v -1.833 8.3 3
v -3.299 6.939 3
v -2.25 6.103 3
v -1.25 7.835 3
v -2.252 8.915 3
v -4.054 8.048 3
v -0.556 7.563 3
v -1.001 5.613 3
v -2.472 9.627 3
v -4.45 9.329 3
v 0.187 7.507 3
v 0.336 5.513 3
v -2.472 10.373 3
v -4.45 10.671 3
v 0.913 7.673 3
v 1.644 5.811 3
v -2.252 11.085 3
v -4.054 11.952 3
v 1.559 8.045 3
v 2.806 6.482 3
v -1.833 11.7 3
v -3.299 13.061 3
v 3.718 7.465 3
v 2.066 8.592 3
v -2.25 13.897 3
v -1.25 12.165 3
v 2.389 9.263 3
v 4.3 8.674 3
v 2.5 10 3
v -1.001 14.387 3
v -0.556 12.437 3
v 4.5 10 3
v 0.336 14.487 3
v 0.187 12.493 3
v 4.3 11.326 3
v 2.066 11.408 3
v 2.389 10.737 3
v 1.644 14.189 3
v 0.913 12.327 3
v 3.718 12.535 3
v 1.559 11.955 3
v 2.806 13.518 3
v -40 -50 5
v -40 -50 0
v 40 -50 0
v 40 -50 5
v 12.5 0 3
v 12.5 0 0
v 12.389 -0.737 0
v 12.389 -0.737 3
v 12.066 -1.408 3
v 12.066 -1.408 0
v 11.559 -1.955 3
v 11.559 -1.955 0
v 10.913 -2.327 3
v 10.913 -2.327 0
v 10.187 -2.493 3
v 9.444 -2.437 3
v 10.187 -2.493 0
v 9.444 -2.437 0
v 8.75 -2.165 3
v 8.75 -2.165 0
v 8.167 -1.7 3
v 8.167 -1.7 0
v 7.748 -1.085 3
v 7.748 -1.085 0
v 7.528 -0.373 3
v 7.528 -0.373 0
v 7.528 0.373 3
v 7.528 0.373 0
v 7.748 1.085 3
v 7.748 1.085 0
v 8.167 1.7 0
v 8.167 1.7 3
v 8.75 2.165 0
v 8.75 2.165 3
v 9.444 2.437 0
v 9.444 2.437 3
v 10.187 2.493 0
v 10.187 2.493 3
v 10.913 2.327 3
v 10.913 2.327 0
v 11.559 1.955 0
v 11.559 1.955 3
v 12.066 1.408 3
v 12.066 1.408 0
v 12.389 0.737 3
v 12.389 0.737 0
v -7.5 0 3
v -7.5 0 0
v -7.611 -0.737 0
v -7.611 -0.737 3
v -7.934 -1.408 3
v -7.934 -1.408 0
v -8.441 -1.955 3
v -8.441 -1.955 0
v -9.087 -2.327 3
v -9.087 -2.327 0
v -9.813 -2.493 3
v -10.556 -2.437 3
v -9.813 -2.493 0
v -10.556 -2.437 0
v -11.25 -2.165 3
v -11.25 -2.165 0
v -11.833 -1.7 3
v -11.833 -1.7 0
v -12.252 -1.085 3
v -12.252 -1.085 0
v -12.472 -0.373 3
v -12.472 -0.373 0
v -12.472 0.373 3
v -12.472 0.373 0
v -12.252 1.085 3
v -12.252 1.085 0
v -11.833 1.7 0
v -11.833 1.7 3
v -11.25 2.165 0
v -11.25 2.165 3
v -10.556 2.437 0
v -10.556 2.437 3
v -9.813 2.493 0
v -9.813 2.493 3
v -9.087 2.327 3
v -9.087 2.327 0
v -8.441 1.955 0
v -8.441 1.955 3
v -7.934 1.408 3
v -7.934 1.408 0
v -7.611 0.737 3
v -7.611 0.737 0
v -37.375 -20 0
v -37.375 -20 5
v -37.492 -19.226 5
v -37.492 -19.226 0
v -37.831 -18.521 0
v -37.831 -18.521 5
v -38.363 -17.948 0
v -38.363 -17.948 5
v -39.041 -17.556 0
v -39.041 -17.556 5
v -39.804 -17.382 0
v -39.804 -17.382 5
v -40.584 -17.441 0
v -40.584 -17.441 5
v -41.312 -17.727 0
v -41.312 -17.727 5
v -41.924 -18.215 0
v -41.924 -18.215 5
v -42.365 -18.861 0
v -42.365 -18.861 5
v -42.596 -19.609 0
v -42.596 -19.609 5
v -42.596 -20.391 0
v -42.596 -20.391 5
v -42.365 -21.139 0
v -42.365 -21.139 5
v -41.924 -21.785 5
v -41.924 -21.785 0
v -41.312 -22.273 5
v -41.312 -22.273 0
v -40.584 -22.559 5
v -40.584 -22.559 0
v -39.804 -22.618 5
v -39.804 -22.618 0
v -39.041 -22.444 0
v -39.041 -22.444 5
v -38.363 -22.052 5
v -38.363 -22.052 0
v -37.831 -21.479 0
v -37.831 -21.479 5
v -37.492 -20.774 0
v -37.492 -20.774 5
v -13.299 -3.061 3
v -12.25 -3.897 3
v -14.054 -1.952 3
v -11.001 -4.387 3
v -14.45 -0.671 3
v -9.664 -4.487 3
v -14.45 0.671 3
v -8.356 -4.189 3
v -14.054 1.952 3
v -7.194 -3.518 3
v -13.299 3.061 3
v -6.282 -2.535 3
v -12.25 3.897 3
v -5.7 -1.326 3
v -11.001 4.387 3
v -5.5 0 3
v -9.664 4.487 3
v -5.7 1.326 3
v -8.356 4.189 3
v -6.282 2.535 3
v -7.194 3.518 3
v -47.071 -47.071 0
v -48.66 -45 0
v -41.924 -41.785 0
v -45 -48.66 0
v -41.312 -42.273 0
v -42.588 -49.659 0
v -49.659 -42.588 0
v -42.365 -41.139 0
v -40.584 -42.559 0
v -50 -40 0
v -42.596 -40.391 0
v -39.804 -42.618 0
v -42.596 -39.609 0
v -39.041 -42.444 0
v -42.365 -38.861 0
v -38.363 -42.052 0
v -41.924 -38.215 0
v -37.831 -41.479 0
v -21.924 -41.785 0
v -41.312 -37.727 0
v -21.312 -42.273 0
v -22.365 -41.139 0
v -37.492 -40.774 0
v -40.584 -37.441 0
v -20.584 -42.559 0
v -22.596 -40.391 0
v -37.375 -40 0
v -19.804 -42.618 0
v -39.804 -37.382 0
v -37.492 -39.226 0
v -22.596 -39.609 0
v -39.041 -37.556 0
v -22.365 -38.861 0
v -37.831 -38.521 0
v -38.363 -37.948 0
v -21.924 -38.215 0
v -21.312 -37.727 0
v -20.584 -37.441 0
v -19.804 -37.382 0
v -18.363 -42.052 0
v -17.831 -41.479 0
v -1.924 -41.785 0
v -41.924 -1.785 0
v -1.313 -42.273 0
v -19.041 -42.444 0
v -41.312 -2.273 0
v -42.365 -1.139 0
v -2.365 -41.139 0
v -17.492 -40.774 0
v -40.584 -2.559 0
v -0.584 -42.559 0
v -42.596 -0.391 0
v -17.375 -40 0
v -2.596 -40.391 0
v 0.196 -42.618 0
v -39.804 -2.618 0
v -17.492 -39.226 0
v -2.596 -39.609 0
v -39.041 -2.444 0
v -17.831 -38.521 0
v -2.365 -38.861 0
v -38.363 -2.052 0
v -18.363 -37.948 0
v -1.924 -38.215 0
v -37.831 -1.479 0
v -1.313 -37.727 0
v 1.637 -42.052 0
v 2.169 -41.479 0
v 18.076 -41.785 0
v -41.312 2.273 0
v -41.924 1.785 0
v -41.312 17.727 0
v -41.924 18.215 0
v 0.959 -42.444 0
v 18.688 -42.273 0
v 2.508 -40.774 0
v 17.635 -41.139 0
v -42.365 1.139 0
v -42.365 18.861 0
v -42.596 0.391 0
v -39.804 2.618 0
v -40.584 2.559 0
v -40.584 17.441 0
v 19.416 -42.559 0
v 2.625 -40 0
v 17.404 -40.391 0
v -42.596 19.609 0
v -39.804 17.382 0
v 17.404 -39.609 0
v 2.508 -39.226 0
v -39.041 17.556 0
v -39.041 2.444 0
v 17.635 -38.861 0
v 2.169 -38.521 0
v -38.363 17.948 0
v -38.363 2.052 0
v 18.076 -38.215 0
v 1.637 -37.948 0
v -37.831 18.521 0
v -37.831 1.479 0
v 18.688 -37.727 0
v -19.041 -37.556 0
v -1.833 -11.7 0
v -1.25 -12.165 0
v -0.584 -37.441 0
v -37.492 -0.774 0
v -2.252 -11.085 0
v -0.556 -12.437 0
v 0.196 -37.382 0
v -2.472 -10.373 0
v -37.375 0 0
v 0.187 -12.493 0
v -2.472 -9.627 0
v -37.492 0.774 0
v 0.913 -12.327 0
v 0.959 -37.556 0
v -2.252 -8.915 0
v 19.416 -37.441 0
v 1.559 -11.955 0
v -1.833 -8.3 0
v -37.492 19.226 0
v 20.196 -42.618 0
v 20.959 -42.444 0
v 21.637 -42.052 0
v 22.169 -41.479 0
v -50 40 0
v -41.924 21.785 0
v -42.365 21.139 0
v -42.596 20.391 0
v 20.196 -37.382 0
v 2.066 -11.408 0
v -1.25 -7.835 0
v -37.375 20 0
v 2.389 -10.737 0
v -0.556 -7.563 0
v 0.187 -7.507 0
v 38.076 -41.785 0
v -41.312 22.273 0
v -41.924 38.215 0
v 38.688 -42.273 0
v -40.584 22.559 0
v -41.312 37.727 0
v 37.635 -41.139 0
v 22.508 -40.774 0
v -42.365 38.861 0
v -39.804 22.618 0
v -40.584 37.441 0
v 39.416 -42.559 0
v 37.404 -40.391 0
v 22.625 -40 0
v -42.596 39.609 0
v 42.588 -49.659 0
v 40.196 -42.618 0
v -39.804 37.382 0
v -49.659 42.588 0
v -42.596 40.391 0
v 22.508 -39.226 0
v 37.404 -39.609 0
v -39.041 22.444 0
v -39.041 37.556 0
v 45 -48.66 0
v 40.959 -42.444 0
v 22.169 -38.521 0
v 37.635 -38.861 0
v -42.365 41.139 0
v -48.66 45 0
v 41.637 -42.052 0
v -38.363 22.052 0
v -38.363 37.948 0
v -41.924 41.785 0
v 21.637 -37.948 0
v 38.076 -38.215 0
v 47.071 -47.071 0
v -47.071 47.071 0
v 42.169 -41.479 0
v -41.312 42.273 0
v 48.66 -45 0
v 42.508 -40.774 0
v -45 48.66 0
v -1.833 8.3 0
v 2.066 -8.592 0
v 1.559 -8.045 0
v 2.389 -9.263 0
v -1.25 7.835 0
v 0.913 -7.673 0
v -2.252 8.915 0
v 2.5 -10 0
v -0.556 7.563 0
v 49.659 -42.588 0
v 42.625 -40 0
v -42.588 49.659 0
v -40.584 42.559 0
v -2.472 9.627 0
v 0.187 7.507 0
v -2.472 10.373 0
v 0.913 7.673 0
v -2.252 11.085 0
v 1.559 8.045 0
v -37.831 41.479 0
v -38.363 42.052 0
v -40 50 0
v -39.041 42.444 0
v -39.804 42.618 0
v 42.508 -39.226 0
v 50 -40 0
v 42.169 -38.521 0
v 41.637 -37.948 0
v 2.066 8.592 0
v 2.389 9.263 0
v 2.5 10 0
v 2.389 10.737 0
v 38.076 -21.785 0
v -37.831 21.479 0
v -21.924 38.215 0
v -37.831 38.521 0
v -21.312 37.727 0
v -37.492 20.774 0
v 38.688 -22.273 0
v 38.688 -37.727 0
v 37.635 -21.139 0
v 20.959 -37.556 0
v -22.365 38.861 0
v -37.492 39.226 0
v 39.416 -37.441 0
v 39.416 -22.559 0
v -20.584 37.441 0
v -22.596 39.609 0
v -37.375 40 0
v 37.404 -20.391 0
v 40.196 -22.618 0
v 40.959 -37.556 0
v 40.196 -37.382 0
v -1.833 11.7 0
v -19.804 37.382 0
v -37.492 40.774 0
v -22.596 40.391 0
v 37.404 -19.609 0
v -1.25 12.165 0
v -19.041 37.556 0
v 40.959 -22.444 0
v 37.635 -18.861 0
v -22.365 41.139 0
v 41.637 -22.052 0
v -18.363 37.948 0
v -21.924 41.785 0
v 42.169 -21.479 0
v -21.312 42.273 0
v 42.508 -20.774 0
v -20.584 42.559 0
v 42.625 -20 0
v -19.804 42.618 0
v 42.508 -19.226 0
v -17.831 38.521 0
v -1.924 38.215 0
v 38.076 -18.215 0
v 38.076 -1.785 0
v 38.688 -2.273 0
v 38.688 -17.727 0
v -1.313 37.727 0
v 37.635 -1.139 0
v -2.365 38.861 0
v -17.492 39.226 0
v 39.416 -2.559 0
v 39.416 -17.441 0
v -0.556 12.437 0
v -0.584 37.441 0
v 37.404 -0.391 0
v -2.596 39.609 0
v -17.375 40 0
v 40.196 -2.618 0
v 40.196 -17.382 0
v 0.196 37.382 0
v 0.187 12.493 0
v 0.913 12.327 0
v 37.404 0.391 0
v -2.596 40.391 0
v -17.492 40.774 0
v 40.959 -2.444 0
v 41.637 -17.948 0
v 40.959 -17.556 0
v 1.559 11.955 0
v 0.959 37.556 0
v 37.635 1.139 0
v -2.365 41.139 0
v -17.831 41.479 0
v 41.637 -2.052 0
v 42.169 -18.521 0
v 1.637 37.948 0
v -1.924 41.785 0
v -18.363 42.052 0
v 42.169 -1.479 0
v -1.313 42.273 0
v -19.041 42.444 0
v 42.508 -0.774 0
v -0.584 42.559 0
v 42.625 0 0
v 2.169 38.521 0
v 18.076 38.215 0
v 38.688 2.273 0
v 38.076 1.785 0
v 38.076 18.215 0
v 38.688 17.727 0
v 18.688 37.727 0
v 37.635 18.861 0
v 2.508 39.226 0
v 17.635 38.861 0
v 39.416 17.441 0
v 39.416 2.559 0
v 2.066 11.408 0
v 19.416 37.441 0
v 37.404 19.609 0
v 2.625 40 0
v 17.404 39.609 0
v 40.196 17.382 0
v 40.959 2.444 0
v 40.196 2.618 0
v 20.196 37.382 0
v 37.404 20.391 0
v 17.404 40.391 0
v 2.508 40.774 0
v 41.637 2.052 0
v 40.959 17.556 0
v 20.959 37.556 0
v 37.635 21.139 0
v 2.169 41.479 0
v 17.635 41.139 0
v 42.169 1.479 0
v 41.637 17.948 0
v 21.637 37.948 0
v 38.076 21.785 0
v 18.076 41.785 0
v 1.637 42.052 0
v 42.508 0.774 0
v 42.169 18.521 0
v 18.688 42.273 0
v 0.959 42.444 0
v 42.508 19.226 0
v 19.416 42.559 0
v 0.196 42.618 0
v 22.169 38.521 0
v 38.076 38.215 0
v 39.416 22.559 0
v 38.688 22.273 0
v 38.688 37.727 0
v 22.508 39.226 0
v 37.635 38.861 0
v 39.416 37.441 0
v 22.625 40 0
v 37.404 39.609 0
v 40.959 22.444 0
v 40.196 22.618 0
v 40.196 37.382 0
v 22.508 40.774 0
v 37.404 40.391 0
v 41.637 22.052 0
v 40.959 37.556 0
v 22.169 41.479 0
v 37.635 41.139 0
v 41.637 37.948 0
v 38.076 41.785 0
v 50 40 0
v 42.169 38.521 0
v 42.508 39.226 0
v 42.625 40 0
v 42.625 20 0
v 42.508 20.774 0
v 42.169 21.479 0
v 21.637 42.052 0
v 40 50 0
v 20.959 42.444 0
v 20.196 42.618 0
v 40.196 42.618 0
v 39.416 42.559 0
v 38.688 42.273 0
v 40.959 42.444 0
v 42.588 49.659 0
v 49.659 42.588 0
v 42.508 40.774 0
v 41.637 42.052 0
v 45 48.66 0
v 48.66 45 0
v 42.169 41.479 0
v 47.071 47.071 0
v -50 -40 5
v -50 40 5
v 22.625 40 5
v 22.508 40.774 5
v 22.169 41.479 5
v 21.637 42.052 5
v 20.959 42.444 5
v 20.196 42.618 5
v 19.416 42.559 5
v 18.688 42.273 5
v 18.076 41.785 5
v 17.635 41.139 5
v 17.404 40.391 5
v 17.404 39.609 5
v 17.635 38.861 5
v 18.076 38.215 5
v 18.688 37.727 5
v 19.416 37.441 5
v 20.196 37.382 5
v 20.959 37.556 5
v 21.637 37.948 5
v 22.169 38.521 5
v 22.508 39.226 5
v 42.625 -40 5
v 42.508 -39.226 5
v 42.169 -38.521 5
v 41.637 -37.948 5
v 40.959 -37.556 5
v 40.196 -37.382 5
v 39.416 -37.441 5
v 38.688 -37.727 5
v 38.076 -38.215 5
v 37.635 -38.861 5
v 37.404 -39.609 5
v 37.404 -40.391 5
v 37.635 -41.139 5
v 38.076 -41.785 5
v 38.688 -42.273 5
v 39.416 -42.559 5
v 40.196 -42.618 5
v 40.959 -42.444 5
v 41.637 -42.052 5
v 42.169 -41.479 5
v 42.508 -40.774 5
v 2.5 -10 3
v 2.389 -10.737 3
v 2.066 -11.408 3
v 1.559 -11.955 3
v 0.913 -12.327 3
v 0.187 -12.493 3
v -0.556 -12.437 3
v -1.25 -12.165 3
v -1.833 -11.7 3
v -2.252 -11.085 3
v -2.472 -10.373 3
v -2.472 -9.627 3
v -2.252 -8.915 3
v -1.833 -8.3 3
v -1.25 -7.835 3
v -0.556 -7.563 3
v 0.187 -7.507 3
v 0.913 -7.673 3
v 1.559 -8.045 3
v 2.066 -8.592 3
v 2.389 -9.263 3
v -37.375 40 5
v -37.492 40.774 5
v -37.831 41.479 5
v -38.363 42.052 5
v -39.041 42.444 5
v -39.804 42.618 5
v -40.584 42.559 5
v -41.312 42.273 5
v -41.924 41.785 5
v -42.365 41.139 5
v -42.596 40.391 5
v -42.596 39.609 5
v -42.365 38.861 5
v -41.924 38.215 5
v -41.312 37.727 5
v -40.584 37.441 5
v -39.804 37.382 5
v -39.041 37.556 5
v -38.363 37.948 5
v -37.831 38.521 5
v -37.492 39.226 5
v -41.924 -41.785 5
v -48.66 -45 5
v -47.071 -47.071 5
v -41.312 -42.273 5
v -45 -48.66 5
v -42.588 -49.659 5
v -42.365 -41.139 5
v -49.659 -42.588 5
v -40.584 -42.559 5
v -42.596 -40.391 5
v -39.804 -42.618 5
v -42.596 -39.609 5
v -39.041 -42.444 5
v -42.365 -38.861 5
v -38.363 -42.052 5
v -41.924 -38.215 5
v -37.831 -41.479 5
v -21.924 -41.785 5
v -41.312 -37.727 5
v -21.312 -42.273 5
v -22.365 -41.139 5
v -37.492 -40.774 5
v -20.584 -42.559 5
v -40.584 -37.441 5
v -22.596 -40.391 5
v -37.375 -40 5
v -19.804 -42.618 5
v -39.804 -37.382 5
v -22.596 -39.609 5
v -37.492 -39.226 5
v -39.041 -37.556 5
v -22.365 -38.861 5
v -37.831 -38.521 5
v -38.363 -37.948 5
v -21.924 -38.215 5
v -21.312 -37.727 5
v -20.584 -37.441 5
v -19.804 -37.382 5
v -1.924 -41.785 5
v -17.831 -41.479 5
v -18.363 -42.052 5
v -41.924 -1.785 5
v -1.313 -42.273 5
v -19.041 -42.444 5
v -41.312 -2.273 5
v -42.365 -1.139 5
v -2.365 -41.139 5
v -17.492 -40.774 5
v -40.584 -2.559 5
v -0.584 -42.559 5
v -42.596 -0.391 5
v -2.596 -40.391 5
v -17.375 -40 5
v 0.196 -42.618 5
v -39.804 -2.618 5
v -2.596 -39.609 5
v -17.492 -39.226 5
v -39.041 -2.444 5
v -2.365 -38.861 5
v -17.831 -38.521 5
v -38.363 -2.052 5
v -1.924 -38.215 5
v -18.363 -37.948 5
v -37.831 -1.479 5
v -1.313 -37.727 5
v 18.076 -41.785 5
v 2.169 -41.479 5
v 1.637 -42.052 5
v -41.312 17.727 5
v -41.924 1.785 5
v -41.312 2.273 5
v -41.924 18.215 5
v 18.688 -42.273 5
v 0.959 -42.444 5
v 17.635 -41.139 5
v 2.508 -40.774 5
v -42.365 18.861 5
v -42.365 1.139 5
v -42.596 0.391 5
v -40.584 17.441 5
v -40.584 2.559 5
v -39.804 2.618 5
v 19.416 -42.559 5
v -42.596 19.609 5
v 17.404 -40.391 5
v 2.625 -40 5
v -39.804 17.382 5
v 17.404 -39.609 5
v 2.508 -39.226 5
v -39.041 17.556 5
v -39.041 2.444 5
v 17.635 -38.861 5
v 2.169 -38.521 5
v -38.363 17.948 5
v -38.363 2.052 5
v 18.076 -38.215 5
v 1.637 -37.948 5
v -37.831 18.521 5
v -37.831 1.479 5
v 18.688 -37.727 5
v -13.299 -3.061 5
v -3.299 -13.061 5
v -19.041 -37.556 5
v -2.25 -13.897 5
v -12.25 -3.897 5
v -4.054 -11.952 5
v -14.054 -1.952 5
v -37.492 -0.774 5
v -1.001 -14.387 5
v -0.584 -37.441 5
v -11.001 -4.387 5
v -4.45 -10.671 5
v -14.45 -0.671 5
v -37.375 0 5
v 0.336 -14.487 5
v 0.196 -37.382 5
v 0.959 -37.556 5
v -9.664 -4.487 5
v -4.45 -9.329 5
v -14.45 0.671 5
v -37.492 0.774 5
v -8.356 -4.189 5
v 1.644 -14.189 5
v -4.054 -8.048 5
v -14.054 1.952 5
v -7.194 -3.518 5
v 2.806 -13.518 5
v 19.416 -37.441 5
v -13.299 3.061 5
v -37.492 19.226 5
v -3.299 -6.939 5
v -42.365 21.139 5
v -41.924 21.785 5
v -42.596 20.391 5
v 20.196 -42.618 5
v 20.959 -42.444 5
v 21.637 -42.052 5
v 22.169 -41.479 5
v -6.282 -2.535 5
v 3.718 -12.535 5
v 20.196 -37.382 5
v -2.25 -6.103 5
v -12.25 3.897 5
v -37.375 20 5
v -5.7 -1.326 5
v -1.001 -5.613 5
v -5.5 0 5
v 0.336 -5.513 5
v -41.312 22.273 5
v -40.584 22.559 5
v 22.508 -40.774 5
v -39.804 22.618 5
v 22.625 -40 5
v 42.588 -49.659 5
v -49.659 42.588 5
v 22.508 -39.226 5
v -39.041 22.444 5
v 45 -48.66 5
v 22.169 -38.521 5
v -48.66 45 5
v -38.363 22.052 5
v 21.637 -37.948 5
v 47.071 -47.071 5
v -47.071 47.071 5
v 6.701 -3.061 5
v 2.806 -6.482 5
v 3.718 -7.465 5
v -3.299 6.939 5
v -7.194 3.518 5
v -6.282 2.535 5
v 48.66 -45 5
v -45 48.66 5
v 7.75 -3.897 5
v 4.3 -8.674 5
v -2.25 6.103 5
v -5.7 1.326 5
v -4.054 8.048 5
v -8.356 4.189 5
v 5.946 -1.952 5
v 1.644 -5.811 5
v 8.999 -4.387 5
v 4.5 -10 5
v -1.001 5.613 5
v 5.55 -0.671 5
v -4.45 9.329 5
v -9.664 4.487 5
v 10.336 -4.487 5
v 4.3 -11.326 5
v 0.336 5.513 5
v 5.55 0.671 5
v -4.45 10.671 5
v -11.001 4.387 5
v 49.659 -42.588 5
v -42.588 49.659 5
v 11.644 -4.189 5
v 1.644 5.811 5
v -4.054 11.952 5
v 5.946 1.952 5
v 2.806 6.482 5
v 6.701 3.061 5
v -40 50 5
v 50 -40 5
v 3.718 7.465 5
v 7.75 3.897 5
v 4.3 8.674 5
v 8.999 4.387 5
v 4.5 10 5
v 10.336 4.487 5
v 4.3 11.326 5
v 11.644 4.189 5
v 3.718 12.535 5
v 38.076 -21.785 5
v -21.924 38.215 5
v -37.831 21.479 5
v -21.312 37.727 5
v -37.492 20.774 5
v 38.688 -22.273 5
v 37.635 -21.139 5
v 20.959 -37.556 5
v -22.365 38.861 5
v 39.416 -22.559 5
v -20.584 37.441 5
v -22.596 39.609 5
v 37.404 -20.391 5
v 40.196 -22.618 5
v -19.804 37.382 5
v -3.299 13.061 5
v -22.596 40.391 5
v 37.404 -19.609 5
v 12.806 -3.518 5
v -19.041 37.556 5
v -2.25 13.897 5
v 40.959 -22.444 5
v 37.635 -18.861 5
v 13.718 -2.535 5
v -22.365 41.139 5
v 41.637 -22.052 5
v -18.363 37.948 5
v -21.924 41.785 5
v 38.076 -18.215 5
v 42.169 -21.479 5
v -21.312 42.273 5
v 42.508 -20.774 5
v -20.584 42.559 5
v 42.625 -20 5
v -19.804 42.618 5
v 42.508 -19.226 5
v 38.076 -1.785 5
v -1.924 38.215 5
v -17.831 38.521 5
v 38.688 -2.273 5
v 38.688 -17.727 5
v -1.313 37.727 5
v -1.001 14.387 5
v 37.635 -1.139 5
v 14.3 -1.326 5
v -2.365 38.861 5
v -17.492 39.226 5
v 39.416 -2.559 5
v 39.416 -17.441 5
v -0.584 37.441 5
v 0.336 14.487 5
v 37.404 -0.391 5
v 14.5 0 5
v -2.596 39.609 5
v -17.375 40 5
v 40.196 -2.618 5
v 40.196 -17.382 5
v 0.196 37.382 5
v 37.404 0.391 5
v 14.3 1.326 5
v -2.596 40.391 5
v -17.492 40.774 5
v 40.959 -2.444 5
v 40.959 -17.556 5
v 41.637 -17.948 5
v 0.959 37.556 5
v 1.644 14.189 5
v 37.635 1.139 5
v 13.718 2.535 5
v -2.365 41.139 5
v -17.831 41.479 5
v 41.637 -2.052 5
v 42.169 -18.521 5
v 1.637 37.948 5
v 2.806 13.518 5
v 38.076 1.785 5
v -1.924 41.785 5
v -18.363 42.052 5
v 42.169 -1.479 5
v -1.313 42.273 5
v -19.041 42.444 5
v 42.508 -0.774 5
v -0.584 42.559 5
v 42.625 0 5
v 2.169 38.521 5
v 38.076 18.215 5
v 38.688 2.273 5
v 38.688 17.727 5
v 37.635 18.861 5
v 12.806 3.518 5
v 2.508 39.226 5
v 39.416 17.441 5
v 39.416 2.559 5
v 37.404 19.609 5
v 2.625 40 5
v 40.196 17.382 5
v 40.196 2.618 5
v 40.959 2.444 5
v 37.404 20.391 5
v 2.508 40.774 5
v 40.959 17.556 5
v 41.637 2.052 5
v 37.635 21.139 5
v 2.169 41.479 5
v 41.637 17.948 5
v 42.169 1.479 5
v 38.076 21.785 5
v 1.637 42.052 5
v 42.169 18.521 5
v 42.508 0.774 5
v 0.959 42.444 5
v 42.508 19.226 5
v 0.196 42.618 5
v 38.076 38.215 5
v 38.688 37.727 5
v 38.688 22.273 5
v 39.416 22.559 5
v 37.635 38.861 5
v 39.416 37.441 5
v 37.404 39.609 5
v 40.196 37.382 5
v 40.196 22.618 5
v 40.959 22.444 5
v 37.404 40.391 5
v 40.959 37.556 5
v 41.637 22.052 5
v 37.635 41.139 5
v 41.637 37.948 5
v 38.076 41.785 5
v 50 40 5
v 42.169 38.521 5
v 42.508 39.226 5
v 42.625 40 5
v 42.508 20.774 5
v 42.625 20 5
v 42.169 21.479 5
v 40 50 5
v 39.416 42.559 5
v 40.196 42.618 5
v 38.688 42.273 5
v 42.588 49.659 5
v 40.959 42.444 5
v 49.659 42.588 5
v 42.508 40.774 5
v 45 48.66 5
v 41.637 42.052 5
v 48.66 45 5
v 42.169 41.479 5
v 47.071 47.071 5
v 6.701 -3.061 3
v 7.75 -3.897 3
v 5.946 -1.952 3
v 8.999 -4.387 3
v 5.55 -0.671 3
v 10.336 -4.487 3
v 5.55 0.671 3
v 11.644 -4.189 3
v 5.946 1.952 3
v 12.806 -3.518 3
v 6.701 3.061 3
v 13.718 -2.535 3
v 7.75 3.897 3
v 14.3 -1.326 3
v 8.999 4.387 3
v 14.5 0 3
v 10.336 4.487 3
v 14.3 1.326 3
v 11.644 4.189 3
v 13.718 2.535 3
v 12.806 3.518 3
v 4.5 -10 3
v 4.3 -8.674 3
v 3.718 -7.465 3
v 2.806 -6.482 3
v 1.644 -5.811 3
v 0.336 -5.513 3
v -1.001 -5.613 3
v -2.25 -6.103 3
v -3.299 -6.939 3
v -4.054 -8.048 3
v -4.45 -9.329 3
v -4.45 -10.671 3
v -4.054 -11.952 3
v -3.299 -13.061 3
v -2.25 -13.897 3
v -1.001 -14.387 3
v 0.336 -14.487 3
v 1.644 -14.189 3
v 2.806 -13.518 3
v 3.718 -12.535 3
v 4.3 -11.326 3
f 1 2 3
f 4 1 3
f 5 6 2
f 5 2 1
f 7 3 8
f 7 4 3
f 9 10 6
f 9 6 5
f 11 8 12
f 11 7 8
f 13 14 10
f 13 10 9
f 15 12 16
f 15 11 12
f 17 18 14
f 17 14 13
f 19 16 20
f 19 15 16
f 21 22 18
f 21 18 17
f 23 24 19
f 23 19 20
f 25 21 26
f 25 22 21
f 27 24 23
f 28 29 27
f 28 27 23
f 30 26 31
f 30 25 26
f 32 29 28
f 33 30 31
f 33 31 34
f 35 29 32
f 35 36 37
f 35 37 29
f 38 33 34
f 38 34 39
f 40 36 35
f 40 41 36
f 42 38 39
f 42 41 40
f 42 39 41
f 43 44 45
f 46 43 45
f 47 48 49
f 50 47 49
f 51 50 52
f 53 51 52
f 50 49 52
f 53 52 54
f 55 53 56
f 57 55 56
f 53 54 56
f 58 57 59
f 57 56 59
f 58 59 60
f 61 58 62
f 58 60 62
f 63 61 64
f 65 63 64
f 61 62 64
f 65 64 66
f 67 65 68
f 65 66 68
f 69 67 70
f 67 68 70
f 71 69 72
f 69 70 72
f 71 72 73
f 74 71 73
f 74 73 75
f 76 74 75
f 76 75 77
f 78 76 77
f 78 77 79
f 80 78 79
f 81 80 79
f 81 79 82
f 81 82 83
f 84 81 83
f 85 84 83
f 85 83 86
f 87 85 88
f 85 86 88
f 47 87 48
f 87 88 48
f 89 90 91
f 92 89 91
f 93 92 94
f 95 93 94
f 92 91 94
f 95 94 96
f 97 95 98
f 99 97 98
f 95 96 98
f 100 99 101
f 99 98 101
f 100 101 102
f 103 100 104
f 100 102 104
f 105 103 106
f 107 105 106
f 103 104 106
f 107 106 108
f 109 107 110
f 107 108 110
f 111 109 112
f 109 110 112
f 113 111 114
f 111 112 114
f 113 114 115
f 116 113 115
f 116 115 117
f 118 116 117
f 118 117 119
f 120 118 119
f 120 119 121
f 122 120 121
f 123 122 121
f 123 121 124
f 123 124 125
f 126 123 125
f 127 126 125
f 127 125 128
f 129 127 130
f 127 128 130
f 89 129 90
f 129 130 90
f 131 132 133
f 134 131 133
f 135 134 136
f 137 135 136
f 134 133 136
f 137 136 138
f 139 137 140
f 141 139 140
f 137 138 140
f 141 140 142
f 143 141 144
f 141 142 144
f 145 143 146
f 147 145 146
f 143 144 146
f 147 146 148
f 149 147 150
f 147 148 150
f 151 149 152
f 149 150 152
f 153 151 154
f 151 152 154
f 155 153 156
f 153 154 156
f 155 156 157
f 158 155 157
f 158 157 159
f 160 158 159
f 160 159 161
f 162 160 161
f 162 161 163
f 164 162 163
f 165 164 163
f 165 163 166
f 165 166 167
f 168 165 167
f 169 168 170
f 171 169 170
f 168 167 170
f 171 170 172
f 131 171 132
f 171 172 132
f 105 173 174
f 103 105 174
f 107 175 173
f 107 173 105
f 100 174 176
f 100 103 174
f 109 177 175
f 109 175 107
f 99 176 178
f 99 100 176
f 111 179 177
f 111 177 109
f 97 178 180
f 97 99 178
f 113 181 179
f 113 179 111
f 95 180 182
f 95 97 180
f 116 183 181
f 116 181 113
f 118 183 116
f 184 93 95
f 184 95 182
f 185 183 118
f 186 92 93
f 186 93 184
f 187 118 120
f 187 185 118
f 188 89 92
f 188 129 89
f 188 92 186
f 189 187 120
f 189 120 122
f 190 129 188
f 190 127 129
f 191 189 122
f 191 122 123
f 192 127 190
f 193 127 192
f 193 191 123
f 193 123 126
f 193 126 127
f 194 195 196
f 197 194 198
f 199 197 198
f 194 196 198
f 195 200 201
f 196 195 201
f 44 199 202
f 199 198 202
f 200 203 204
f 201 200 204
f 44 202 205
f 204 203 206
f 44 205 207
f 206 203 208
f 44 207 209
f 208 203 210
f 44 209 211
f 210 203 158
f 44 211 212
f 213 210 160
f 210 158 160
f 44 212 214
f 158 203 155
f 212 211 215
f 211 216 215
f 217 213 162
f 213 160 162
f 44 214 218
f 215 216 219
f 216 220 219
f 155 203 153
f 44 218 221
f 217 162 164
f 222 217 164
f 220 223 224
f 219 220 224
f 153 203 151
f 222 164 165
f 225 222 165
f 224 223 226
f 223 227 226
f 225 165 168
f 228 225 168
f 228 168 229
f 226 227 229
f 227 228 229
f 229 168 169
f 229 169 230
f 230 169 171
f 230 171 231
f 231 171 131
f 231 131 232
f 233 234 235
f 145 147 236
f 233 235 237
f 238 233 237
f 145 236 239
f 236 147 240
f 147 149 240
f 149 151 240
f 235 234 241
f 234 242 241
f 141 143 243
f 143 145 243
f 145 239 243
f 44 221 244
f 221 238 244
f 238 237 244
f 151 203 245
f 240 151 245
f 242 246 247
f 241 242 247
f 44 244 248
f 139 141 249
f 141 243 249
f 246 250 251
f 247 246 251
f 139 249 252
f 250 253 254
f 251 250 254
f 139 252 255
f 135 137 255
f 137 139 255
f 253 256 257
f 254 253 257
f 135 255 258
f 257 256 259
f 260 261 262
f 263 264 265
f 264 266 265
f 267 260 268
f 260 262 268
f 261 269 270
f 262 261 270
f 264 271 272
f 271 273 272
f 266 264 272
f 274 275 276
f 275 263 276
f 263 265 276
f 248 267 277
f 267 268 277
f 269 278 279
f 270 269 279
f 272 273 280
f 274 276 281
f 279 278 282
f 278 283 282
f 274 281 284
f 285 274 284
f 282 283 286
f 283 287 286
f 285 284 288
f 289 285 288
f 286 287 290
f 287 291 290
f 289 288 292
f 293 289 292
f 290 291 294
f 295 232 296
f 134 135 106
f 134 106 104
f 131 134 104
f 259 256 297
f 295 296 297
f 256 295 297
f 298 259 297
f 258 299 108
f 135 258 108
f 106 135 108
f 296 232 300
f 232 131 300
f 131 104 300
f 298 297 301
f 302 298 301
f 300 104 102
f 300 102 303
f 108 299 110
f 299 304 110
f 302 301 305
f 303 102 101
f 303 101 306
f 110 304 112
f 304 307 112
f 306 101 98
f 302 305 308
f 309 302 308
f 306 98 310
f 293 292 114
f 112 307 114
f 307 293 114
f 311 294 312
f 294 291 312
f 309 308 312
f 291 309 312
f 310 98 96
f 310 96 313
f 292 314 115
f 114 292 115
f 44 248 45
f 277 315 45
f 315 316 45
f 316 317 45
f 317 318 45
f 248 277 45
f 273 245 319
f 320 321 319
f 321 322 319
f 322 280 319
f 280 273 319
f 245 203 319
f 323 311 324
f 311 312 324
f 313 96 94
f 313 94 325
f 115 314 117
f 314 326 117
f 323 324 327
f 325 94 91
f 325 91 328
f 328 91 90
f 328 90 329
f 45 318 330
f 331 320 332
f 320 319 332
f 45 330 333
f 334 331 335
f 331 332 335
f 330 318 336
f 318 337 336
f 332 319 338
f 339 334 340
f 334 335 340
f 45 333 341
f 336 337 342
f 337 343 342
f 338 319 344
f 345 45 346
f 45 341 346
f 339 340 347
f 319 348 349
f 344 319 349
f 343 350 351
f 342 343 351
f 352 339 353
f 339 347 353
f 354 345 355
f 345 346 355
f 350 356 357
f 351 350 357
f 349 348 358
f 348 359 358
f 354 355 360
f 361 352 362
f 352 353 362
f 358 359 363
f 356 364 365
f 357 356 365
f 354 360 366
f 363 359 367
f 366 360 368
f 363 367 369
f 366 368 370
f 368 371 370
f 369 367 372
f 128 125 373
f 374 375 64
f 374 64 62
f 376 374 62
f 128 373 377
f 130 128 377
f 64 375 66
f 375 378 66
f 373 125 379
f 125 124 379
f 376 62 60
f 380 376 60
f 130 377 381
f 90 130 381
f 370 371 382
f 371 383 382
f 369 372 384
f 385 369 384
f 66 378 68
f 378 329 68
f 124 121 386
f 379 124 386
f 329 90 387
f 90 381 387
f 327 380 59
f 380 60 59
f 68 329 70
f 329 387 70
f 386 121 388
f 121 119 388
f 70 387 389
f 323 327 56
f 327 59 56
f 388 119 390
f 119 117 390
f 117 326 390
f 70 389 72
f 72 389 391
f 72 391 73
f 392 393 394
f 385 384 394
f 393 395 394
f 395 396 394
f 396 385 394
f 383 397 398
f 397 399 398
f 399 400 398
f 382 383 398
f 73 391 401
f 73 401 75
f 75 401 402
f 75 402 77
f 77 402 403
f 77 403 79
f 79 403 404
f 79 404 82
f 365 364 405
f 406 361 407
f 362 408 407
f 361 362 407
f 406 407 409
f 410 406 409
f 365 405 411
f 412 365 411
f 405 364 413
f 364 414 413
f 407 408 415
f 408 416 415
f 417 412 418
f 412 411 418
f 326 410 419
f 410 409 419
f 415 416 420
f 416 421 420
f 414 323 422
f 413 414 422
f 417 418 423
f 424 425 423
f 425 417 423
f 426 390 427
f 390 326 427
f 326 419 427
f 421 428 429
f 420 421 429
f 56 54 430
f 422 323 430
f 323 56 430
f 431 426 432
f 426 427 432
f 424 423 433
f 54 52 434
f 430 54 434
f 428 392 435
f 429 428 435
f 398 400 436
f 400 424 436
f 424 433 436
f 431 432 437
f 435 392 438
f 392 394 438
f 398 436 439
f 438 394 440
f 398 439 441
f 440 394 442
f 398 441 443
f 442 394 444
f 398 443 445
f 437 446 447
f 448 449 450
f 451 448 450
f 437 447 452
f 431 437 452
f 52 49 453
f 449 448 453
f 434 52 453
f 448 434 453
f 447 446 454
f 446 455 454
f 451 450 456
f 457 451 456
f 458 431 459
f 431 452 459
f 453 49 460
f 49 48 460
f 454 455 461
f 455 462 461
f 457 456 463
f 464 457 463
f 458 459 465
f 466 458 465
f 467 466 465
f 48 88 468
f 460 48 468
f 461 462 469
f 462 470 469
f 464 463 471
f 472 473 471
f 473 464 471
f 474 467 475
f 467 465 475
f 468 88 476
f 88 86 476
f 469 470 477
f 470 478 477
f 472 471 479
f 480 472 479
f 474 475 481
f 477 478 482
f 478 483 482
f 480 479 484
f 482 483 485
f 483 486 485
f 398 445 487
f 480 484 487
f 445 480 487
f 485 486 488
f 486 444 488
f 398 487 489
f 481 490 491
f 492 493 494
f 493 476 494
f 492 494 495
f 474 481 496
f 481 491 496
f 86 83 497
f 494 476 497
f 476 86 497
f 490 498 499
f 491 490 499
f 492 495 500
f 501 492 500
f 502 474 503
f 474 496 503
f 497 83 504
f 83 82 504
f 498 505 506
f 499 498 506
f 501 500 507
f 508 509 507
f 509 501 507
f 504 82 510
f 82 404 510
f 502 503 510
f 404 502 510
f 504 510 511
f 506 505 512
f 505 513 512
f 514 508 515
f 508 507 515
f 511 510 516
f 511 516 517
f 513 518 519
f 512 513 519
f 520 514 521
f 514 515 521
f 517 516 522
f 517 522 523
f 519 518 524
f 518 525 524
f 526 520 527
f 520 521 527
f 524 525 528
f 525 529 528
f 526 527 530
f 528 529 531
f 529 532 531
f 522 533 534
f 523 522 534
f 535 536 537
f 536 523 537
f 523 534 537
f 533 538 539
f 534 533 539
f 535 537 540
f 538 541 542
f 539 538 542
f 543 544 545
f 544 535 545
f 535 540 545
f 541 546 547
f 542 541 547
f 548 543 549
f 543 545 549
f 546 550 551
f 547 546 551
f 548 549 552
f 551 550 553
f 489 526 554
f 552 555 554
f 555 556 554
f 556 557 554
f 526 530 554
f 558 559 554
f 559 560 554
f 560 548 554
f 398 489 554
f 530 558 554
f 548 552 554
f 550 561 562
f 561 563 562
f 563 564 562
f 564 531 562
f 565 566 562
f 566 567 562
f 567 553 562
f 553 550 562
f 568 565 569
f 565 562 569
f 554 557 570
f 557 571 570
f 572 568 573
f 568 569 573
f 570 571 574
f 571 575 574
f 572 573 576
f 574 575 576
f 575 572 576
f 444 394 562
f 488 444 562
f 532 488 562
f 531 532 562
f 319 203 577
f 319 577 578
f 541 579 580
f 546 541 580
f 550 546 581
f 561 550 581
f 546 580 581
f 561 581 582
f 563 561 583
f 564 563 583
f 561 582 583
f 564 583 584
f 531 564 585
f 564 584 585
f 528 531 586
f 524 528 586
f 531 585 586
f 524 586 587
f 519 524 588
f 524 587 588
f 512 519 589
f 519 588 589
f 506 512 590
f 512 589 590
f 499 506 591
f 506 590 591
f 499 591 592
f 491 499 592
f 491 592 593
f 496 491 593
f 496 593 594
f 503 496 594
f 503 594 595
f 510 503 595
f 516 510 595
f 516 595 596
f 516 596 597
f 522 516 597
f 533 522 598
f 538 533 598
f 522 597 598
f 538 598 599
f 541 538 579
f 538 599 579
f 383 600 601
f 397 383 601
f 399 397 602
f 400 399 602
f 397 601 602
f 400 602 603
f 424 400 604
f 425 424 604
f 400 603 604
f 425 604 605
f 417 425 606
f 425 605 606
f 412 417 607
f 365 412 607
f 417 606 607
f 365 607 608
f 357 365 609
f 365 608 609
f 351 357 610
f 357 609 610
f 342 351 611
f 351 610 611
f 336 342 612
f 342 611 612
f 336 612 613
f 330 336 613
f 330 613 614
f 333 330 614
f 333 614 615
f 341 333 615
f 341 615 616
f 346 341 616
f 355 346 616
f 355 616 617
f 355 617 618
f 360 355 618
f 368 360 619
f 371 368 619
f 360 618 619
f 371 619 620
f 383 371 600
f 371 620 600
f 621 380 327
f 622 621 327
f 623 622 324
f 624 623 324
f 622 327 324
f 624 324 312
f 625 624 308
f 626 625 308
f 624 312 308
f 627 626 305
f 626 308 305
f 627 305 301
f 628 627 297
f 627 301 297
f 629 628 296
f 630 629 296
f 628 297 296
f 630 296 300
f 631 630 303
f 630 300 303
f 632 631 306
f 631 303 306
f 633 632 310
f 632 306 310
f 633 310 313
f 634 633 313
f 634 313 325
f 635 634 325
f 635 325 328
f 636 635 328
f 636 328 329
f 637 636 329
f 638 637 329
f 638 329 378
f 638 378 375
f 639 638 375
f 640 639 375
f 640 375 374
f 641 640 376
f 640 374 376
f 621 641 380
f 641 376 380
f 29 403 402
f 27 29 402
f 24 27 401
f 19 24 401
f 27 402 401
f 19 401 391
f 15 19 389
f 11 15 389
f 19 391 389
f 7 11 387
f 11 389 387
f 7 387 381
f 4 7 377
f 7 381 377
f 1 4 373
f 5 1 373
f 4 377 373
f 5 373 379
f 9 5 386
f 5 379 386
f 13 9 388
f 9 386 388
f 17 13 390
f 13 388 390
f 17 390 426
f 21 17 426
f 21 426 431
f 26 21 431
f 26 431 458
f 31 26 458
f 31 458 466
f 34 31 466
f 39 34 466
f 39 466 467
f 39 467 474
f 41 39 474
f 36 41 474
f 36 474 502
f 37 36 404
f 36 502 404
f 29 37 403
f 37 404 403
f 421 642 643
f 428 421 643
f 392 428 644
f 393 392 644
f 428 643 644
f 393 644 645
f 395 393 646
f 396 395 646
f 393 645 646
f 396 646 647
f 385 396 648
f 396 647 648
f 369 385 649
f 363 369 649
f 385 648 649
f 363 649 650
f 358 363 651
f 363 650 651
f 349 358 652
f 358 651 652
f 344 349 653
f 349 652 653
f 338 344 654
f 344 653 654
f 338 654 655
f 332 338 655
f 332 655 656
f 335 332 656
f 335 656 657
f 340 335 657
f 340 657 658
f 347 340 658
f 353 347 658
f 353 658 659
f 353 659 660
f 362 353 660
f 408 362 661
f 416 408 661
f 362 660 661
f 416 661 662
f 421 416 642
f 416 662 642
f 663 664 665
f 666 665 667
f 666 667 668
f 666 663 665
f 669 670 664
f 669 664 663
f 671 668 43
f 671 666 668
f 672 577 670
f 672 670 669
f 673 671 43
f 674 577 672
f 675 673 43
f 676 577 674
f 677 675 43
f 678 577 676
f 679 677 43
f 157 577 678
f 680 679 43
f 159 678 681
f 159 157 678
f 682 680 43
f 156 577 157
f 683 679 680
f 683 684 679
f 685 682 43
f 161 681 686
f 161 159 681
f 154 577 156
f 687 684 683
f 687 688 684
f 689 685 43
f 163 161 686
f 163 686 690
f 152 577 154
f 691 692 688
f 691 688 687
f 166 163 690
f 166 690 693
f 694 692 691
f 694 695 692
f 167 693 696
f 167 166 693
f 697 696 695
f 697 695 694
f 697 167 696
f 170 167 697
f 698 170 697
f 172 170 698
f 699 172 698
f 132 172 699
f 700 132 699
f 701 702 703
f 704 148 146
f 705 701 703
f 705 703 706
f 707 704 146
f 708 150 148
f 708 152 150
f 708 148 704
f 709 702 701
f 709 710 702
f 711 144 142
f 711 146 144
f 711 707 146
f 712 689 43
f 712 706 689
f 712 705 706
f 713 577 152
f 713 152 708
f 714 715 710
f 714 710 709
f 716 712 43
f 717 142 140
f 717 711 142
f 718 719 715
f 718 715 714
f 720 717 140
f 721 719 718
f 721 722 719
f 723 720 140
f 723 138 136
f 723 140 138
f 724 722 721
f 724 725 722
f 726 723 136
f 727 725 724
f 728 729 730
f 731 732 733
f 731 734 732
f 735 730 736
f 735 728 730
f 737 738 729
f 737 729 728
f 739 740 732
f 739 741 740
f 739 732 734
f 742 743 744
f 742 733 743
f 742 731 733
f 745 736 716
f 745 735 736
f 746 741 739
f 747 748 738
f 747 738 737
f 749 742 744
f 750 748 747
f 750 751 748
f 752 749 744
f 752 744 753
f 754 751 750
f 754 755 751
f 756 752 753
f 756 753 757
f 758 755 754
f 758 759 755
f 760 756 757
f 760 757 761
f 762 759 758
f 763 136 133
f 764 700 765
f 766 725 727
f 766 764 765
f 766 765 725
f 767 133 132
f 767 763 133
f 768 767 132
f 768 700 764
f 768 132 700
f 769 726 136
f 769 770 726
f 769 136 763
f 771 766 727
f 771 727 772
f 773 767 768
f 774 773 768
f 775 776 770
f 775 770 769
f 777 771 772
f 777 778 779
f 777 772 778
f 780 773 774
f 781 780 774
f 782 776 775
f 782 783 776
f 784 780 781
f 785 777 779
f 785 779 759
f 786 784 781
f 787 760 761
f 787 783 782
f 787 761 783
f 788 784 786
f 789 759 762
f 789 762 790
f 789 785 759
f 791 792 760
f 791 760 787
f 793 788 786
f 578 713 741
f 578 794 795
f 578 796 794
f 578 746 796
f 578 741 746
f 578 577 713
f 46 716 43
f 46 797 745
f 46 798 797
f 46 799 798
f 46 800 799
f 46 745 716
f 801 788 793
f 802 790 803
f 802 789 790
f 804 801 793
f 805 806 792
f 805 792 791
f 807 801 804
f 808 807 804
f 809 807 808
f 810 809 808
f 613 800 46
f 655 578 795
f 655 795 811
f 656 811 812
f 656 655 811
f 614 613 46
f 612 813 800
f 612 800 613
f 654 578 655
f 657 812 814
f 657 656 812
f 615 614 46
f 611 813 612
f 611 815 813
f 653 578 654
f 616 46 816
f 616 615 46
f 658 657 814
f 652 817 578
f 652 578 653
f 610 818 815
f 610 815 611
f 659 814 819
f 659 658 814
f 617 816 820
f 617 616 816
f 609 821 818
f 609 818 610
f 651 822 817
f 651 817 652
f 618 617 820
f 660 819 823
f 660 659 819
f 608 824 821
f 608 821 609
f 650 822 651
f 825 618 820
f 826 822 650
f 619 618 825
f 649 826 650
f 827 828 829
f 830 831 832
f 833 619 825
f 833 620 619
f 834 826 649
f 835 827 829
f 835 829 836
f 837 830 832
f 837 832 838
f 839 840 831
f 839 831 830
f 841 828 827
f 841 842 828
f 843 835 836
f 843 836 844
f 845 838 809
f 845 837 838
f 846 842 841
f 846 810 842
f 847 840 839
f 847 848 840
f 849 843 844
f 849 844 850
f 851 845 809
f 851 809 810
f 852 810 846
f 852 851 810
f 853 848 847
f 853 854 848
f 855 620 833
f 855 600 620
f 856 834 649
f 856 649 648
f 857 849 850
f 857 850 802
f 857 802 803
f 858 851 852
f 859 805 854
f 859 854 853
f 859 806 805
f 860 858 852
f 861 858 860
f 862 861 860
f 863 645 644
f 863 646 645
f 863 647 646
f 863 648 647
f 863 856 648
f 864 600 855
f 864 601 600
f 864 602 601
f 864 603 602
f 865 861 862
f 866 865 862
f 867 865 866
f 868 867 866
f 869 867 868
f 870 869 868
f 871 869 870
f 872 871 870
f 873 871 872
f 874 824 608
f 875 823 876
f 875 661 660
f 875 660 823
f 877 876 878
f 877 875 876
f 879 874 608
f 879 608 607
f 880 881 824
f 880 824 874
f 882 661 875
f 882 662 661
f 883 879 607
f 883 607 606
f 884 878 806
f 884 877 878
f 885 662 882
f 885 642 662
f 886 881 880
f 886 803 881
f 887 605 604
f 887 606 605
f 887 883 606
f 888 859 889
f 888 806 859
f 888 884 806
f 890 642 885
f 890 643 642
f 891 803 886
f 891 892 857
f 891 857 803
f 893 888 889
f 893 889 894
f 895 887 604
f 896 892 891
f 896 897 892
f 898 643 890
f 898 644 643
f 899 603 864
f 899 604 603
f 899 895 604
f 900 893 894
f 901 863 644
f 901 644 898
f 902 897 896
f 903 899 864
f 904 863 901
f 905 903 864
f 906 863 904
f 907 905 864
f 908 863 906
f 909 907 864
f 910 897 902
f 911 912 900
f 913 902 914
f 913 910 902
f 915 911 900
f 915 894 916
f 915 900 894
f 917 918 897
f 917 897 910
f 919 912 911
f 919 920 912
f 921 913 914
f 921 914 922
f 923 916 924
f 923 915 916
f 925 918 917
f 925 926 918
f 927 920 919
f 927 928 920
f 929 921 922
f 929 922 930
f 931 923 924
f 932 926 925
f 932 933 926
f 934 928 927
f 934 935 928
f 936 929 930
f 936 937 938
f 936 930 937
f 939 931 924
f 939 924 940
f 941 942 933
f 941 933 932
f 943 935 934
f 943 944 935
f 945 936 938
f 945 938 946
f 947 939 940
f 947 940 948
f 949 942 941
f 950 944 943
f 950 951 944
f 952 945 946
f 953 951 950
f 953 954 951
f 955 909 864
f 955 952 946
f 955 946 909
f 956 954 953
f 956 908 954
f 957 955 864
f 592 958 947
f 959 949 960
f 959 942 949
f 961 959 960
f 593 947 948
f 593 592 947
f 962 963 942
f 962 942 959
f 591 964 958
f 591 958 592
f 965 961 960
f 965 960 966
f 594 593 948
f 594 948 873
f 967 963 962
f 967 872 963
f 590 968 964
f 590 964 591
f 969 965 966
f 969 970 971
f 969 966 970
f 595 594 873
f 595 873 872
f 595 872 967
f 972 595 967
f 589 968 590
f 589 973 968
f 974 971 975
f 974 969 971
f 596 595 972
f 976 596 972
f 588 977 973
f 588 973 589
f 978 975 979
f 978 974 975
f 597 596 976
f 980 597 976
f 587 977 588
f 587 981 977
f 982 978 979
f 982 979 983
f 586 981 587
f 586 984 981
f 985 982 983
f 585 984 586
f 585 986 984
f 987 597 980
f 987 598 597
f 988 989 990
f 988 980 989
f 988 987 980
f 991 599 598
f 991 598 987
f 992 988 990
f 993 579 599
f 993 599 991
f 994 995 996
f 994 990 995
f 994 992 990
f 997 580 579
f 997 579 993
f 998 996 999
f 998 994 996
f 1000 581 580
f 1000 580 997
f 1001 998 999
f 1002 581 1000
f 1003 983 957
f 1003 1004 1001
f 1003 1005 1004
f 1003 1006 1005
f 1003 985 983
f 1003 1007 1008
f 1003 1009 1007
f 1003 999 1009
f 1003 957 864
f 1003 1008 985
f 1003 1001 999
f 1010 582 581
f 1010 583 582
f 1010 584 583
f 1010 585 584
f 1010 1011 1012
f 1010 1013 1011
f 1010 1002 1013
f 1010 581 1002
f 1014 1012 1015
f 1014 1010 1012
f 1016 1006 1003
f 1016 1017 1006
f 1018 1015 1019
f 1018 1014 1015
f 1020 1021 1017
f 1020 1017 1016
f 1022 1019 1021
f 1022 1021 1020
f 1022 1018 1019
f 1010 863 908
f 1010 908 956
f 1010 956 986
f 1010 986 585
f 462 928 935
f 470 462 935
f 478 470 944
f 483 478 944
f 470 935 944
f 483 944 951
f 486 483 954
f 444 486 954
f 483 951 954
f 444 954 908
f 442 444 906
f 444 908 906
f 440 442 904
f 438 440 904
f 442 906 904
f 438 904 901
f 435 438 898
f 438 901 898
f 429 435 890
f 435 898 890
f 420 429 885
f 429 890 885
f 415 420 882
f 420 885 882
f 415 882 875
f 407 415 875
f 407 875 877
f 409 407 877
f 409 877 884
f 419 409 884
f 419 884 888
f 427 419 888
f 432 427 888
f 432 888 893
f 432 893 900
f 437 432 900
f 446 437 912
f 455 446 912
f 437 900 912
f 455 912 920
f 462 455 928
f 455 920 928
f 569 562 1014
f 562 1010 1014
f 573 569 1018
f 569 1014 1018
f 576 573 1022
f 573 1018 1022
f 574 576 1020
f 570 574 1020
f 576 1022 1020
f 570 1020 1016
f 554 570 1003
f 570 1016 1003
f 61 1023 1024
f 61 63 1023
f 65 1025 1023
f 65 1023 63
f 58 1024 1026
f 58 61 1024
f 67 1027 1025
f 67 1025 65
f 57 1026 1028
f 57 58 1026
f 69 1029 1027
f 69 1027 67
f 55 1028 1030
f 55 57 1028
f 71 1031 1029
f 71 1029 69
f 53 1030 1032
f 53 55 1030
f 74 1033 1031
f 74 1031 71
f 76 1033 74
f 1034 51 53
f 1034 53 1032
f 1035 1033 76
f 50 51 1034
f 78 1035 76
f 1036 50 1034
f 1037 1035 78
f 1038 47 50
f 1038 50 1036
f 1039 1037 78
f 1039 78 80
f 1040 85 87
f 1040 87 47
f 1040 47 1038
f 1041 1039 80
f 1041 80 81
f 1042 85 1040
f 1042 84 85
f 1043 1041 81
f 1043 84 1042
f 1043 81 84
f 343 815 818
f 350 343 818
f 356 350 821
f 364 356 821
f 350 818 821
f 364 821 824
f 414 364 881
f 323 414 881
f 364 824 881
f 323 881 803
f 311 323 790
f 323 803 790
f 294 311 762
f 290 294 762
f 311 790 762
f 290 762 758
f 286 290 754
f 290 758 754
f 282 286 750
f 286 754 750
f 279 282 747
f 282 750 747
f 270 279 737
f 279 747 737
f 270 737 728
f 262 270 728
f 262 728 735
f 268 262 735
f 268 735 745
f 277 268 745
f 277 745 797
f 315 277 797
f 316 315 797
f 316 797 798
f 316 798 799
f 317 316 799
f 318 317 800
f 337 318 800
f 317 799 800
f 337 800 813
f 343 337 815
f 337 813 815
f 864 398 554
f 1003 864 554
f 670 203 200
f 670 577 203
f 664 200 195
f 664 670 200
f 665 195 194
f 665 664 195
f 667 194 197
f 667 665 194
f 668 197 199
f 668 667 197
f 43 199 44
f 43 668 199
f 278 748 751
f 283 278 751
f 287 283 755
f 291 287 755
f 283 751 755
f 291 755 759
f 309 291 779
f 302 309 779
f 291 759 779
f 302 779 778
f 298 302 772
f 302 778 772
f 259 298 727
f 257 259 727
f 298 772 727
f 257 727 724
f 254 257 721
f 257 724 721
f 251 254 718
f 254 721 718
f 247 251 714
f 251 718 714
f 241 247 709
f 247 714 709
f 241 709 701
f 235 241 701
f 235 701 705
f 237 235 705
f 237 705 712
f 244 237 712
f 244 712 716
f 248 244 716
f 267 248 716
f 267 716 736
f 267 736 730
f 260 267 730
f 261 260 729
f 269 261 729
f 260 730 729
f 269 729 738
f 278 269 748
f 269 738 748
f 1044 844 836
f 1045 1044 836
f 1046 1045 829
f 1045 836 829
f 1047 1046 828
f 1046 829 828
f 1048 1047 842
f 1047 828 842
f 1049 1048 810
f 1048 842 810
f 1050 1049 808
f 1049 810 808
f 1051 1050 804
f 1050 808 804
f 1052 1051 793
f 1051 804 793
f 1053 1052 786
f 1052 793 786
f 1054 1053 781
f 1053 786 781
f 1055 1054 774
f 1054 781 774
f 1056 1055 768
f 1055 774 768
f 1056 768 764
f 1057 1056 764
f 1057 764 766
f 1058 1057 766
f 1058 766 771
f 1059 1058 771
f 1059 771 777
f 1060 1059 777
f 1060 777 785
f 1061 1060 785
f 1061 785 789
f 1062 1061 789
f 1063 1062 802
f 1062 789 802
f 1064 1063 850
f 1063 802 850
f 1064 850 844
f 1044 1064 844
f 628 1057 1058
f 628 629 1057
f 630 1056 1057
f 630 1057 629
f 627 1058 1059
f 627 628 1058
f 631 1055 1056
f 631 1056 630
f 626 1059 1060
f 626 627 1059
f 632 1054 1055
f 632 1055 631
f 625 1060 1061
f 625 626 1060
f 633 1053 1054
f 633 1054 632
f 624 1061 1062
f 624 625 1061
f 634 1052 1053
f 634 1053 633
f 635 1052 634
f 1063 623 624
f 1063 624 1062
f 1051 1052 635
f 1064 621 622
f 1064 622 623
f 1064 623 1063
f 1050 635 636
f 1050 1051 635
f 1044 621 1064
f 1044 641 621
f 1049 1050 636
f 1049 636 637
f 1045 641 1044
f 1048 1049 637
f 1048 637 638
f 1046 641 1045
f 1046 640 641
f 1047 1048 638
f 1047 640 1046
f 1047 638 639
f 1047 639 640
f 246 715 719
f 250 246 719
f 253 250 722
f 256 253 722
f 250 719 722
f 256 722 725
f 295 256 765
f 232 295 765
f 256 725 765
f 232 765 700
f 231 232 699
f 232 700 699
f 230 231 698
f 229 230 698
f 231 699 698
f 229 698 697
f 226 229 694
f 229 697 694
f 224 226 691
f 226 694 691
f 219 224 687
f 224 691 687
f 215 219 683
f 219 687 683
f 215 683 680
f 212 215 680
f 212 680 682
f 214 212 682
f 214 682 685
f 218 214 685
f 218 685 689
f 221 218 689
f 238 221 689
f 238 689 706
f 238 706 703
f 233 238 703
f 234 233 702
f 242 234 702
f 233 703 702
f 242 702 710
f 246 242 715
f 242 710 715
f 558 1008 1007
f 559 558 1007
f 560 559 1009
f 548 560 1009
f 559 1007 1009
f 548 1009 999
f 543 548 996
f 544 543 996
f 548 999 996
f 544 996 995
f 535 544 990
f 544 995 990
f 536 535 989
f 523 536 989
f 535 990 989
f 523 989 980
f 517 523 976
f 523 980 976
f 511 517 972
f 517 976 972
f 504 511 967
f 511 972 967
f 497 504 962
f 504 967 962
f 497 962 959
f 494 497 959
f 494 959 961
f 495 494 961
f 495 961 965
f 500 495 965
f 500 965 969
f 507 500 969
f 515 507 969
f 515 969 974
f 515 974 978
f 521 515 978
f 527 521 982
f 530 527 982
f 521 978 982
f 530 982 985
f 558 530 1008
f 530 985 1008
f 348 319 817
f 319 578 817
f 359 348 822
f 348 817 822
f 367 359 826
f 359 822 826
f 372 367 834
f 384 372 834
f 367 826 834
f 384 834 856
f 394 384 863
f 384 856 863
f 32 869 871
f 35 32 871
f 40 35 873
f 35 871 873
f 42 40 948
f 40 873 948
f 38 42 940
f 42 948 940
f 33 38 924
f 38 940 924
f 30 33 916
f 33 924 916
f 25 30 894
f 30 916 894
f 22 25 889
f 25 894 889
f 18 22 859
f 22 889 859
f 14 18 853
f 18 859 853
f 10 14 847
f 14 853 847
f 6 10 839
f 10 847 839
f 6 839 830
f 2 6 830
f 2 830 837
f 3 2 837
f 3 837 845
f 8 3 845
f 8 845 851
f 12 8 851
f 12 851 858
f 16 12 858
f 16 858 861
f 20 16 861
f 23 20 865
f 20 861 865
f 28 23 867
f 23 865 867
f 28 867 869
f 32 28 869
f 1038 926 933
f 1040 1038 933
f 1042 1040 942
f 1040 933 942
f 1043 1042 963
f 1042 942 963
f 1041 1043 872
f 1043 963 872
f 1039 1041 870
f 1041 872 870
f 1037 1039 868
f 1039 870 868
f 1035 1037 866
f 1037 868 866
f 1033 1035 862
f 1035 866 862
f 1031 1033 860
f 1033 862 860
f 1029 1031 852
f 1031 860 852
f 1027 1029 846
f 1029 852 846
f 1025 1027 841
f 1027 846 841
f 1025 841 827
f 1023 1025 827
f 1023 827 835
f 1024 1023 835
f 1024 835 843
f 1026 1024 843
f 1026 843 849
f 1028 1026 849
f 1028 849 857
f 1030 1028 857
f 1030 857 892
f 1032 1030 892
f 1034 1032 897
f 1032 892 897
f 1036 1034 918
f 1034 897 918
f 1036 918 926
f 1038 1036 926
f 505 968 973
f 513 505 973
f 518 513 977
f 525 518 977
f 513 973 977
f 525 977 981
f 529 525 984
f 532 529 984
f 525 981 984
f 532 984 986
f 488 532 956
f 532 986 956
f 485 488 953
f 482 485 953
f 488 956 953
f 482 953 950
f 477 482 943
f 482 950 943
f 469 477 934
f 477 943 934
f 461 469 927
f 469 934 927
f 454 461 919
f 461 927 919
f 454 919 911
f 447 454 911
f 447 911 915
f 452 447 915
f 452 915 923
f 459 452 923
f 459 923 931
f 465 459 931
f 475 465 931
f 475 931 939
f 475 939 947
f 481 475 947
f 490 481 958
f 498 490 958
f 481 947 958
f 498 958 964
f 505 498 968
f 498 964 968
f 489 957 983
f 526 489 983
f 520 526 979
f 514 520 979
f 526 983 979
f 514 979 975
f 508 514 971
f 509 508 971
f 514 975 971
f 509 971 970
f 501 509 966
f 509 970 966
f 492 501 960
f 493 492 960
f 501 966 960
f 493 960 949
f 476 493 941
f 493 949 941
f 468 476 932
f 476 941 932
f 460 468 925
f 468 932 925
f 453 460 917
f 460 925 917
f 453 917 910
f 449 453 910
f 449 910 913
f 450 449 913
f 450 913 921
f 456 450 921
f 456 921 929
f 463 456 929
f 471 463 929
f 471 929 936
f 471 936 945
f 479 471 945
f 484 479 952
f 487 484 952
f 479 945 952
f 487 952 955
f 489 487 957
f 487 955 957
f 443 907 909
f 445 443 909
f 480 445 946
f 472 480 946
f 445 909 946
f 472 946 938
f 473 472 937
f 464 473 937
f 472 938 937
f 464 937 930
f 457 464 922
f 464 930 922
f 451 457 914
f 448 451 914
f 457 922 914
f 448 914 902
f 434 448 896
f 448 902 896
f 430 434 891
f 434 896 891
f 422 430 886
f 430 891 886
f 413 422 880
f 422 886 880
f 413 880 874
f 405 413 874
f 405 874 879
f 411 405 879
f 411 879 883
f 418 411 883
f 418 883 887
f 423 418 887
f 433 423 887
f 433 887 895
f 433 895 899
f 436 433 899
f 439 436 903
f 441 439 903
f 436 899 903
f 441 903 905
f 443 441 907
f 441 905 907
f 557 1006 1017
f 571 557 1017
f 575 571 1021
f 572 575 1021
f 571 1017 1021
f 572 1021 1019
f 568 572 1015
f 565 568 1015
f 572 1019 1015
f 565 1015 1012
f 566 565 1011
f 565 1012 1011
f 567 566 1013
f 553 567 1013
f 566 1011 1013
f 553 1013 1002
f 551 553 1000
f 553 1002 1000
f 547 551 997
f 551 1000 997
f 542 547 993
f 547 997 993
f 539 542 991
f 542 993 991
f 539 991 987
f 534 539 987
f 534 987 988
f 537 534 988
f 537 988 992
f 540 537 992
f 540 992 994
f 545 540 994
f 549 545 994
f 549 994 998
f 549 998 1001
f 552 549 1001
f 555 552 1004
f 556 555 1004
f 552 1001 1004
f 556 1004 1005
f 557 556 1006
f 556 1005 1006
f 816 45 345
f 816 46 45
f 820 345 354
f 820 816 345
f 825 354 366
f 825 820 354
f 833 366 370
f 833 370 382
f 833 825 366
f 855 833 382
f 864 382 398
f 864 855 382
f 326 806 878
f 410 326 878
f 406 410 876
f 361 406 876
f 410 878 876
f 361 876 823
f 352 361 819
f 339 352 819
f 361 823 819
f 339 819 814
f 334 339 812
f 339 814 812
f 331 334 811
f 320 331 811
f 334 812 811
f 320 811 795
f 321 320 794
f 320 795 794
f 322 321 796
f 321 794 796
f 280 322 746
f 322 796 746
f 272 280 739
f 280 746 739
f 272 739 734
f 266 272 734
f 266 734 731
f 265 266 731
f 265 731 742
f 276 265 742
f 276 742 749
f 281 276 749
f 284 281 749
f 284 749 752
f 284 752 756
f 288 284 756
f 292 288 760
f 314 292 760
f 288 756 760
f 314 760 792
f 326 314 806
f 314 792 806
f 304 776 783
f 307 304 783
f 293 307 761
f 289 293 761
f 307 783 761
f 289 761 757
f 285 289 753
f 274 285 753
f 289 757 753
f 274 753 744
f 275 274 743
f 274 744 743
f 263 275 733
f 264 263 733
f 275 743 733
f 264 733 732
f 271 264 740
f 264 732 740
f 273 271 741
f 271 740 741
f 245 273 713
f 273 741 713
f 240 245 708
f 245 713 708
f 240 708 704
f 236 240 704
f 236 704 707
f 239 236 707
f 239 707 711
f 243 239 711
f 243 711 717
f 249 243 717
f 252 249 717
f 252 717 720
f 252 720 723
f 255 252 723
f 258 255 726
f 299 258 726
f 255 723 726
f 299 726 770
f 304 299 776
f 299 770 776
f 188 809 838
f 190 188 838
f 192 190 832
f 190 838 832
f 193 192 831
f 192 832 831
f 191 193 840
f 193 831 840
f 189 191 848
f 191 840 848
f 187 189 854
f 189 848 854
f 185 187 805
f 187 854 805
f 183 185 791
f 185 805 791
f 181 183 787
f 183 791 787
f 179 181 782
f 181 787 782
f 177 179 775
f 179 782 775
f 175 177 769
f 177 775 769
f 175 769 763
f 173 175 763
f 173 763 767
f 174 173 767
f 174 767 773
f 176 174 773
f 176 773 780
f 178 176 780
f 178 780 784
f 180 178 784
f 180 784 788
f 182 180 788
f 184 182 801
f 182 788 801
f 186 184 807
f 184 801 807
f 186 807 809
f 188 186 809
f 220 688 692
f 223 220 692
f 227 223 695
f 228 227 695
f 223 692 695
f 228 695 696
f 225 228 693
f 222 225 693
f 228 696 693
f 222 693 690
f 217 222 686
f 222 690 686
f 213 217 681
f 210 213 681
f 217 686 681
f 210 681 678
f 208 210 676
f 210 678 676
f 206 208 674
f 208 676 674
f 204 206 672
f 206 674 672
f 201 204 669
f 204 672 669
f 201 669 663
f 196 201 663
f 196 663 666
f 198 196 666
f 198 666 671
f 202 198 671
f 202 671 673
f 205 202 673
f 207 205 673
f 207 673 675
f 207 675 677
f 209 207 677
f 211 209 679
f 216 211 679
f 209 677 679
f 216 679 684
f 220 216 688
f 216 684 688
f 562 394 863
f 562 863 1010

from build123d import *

# Parameters (mm, degrees)
SKETCH_W        = 100
SKETCH_H        = 100
PAD_DEPTH       = 5
SKETCH001_R     = 4.5
POCKET_DEPTH    = 2
SKETCH002_R     = 2.5
POCKET001_DEPTH = 3
SKETCH003_R     = 2.625
POCKET002_DEPTH = 5
FILLET_R        = 10


with BuildPart() as part:
    # Sketch → Pad (new body)
    with BuildSketch(Plane.XY):
        Rectangle(SKETCH_W, SKETCH_H)
    extrude(amount=PAD_DEPTH)

    # Sketch001 (on Face6 of Pad) → Pocket (cut)
    with BuildSketch(Plane.XY.offset(5)):
        with Locations((0, 10)):
            Circle(SKETCH001_R)
        with Locations((10, 0)):
            Circle(SKETCH001_R)
        with Locations((-10, 0)):
            Circle(SKETCH001_R)
        with Locations((0, -10)):
            Circle(SKETCH001_R)
    extrude(amount=-POCKET_DEPTH, mode=Mode.SUBTRACT)

    # Sketch002 (on Face4 of Pocket) → Pocket001 (cut)
    with BuildSketch(Plane(origin=(0, 0, 0), x_dir=(1, 0, 0), z_dir=(0, 0, -1))):
        with Locations((0, 10)):
            Circle(SKETCH002_R)
        with Locations((10, 0)):
            Circle(SKETCH002_R)
        with Locations((0, -10)):
            Circle(SKETCH002_R)
        with Locations((-10, 0)):
            Circle(SKETCH002_R)
    extrude(amount=-POCKET001_DEPTH, mode=Mode.SUBTRACT)

    # Sketch003 (on Face5 of Pocket001) → Pocket002 (cut)
    with BuildSketch(Plane.XY.offset(5)):
        with Locations((-40, 0)):
            Circle(SKETCH003_R)
        with Locations((-40, -40)):
            Circle(SKETCH003_R)
        with Locations((-40, -20)):
            Circle(SKETCH003_R)
        with Locations((-20, -40)):
            Circle(SKETCH003_R)
        with Locations((0, -40)):
            Circle(SKETCH003_R)
        with Locations((20, -40)):
            Circle(SKETCH003_R)
        with Locations((40, -40)):
            Circle(SKETCH003_R)
        with Locations((40, -20)):
            Circle(SKETCH003_R)
        with Locations((40, 0)):
            Circle(SKETCH003_R)
        with Locations((40, 20)):
            Circle(SKETCH003_R)
        with Locations((40, 40)):
            Circle(SKETCH003_R)
        with Locations((20, 40)):
            Circle(SKETCH003_R)
        with Locations((0, 40)):
            Circle(SKETCH003_R)
        with Locations((-20, 40)):
            Circle(SKETCH003_R)
        with Locations((-40, 40)):
            Circle(SKETCH003_R)
        with Locations((-40, 20)):
            Circle(SKETCH003_R)
    extrude(amount=-POCKET002_DEPTH, mode=Mode.SUBTRACT)

    # Fillet
    fillet_edges = [part.edges().sort_by_distance(p)[0] for p in [
        (-50, 50, 2.5),
        (50, 50, 2.5),
        (50, -50, 2.5),
        (-50, -50, 2.5),
    ]]
    fillet(fillet_edges, radius=FILLET_R)


solid = part.part
